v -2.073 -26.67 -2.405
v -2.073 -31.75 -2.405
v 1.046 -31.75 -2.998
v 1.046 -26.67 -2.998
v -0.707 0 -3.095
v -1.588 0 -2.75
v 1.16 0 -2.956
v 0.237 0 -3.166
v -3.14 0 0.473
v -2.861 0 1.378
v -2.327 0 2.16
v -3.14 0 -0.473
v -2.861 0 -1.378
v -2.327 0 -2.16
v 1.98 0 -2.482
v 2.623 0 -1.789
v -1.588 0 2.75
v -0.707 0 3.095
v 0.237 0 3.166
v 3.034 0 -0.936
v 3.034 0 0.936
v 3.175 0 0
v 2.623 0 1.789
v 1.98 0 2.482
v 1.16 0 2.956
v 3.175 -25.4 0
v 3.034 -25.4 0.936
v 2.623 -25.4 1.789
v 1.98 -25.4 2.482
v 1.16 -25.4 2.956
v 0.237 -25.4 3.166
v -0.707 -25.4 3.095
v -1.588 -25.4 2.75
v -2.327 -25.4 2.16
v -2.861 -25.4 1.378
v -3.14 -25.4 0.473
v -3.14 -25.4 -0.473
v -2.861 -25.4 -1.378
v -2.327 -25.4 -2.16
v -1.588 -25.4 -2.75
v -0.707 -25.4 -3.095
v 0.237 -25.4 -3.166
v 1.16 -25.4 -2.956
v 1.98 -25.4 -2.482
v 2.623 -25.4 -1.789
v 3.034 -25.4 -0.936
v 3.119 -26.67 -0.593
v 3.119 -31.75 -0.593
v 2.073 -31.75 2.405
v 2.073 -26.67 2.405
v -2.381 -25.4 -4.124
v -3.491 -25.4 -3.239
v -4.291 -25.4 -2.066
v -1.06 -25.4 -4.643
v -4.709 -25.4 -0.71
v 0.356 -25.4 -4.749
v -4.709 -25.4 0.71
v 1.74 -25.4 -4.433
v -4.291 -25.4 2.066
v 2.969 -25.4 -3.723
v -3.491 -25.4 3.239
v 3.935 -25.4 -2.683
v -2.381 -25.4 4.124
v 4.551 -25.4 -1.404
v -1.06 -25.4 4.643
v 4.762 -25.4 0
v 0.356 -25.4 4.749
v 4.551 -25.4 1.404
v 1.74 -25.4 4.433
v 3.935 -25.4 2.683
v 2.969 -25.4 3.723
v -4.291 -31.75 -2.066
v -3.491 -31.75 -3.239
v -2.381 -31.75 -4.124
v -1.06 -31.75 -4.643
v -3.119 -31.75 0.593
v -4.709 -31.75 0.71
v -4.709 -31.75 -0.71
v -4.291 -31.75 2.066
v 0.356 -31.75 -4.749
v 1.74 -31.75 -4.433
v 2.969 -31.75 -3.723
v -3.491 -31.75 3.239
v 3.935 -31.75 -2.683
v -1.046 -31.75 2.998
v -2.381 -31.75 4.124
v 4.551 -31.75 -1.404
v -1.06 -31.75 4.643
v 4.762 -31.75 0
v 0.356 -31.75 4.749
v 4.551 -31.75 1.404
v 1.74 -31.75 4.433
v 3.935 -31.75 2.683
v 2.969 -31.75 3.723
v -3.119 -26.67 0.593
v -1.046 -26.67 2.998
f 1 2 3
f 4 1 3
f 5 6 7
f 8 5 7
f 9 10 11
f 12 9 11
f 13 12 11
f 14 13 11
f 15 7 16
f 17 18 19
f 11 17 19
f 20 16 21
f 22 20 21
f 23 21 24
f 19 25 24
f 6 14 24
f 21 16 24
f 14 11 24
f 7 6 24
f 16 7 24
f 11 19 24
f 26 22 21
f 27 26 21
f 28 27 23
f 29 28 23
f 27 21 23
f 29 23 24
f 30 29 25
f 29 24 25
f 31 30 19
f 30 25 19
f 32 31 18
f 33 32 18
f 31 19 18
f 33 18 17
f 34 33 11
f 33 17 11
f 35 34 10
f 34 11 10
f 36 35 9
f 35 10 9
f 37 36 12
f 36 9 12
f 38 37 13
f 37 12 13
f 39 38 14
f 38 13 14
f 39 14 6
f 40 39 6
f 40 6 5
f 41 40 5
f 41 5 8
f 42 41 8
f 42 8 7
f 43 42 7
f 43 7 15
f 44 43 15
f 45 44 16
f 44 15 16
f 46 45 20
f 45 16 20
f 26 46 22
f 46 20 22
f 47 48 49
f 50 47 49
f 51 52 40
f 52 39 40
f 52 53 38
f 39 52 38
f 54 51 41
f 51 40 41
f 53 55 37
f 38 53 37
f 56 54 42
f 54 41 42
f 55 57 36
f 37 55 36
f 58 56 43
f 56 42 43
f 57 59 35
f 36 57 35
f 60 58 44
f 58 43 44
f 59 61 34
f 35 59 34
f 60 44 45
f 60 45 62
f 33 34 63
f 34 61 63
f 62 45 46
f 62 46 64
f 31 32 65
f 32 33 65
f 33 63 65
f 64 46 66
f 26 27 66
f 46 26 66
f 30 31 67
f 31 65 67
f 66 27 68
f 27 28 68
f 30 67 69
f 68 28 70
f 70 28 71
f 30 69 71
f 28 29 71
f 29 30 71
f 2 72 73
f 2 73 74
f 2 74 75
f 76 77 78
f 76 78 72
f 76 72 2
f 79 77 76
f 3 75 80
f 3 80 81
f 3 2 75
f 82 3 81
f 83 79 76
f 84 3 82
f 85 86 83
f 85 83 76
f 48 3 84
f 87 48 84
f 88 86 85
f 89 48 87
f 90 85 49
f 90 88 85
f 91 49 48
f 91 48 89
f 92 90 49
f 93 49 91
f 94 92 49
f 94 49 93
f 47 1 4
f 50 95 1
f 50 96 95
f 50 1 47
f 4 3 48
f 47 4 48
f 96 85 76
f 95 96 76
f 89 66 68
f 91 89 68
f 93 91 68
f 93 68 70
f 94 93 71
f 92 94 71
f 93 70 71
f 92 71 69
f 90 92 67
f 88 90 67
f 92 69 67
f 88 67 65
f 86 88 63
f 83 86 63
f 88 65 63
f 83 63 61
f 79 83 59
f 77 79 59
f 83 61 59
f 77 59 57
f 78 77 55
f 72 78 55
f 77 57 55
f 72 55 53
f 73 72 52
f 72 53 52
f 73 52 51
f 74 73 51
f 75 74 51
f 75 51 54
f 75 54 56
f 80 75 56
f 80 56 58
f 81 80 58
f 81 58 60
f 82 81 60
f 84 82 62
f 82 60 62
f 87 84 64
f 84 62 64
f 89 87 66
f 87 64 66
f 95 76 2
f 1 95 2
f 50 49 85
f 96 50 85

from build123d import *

# Parameters (mm, degrees)
F0_R     = 3.175
F1_DEPTH = 25.4
F2_R     = 4.7625
F3_DEPTH = 6.35
F5_DEPTH = 5.08


with BuildPart() as f1:
    # F0 (on Front) → F1 (new body)
    with BuildSketch(Plane.XZ):
        Circle(F0_R)
    extrude(amount=F1_DEPTH)

    # F2 (on face) → F3 (join)
    with BuildSketch(Plane.XZ.offset(25.4)):
        Circle(F2_R)
    extrude(amount=F3_DEPTH)

    # F4 (on face) → F5 (cut)
    with BuildSketch(Plane.XZ.offset(31.75)):
        Polygon((-3.119147, 0.592914), (-2.073052, -2.404803), (1.046095, -2.997718), (3.119147, -0.592914), (2.073052, 2.404803), (-1.046095, 2.997718), align=None)
    extrude(amount=-F5_DEPTH, mode=Mode.SUBTRACT)


solid = f1.part
